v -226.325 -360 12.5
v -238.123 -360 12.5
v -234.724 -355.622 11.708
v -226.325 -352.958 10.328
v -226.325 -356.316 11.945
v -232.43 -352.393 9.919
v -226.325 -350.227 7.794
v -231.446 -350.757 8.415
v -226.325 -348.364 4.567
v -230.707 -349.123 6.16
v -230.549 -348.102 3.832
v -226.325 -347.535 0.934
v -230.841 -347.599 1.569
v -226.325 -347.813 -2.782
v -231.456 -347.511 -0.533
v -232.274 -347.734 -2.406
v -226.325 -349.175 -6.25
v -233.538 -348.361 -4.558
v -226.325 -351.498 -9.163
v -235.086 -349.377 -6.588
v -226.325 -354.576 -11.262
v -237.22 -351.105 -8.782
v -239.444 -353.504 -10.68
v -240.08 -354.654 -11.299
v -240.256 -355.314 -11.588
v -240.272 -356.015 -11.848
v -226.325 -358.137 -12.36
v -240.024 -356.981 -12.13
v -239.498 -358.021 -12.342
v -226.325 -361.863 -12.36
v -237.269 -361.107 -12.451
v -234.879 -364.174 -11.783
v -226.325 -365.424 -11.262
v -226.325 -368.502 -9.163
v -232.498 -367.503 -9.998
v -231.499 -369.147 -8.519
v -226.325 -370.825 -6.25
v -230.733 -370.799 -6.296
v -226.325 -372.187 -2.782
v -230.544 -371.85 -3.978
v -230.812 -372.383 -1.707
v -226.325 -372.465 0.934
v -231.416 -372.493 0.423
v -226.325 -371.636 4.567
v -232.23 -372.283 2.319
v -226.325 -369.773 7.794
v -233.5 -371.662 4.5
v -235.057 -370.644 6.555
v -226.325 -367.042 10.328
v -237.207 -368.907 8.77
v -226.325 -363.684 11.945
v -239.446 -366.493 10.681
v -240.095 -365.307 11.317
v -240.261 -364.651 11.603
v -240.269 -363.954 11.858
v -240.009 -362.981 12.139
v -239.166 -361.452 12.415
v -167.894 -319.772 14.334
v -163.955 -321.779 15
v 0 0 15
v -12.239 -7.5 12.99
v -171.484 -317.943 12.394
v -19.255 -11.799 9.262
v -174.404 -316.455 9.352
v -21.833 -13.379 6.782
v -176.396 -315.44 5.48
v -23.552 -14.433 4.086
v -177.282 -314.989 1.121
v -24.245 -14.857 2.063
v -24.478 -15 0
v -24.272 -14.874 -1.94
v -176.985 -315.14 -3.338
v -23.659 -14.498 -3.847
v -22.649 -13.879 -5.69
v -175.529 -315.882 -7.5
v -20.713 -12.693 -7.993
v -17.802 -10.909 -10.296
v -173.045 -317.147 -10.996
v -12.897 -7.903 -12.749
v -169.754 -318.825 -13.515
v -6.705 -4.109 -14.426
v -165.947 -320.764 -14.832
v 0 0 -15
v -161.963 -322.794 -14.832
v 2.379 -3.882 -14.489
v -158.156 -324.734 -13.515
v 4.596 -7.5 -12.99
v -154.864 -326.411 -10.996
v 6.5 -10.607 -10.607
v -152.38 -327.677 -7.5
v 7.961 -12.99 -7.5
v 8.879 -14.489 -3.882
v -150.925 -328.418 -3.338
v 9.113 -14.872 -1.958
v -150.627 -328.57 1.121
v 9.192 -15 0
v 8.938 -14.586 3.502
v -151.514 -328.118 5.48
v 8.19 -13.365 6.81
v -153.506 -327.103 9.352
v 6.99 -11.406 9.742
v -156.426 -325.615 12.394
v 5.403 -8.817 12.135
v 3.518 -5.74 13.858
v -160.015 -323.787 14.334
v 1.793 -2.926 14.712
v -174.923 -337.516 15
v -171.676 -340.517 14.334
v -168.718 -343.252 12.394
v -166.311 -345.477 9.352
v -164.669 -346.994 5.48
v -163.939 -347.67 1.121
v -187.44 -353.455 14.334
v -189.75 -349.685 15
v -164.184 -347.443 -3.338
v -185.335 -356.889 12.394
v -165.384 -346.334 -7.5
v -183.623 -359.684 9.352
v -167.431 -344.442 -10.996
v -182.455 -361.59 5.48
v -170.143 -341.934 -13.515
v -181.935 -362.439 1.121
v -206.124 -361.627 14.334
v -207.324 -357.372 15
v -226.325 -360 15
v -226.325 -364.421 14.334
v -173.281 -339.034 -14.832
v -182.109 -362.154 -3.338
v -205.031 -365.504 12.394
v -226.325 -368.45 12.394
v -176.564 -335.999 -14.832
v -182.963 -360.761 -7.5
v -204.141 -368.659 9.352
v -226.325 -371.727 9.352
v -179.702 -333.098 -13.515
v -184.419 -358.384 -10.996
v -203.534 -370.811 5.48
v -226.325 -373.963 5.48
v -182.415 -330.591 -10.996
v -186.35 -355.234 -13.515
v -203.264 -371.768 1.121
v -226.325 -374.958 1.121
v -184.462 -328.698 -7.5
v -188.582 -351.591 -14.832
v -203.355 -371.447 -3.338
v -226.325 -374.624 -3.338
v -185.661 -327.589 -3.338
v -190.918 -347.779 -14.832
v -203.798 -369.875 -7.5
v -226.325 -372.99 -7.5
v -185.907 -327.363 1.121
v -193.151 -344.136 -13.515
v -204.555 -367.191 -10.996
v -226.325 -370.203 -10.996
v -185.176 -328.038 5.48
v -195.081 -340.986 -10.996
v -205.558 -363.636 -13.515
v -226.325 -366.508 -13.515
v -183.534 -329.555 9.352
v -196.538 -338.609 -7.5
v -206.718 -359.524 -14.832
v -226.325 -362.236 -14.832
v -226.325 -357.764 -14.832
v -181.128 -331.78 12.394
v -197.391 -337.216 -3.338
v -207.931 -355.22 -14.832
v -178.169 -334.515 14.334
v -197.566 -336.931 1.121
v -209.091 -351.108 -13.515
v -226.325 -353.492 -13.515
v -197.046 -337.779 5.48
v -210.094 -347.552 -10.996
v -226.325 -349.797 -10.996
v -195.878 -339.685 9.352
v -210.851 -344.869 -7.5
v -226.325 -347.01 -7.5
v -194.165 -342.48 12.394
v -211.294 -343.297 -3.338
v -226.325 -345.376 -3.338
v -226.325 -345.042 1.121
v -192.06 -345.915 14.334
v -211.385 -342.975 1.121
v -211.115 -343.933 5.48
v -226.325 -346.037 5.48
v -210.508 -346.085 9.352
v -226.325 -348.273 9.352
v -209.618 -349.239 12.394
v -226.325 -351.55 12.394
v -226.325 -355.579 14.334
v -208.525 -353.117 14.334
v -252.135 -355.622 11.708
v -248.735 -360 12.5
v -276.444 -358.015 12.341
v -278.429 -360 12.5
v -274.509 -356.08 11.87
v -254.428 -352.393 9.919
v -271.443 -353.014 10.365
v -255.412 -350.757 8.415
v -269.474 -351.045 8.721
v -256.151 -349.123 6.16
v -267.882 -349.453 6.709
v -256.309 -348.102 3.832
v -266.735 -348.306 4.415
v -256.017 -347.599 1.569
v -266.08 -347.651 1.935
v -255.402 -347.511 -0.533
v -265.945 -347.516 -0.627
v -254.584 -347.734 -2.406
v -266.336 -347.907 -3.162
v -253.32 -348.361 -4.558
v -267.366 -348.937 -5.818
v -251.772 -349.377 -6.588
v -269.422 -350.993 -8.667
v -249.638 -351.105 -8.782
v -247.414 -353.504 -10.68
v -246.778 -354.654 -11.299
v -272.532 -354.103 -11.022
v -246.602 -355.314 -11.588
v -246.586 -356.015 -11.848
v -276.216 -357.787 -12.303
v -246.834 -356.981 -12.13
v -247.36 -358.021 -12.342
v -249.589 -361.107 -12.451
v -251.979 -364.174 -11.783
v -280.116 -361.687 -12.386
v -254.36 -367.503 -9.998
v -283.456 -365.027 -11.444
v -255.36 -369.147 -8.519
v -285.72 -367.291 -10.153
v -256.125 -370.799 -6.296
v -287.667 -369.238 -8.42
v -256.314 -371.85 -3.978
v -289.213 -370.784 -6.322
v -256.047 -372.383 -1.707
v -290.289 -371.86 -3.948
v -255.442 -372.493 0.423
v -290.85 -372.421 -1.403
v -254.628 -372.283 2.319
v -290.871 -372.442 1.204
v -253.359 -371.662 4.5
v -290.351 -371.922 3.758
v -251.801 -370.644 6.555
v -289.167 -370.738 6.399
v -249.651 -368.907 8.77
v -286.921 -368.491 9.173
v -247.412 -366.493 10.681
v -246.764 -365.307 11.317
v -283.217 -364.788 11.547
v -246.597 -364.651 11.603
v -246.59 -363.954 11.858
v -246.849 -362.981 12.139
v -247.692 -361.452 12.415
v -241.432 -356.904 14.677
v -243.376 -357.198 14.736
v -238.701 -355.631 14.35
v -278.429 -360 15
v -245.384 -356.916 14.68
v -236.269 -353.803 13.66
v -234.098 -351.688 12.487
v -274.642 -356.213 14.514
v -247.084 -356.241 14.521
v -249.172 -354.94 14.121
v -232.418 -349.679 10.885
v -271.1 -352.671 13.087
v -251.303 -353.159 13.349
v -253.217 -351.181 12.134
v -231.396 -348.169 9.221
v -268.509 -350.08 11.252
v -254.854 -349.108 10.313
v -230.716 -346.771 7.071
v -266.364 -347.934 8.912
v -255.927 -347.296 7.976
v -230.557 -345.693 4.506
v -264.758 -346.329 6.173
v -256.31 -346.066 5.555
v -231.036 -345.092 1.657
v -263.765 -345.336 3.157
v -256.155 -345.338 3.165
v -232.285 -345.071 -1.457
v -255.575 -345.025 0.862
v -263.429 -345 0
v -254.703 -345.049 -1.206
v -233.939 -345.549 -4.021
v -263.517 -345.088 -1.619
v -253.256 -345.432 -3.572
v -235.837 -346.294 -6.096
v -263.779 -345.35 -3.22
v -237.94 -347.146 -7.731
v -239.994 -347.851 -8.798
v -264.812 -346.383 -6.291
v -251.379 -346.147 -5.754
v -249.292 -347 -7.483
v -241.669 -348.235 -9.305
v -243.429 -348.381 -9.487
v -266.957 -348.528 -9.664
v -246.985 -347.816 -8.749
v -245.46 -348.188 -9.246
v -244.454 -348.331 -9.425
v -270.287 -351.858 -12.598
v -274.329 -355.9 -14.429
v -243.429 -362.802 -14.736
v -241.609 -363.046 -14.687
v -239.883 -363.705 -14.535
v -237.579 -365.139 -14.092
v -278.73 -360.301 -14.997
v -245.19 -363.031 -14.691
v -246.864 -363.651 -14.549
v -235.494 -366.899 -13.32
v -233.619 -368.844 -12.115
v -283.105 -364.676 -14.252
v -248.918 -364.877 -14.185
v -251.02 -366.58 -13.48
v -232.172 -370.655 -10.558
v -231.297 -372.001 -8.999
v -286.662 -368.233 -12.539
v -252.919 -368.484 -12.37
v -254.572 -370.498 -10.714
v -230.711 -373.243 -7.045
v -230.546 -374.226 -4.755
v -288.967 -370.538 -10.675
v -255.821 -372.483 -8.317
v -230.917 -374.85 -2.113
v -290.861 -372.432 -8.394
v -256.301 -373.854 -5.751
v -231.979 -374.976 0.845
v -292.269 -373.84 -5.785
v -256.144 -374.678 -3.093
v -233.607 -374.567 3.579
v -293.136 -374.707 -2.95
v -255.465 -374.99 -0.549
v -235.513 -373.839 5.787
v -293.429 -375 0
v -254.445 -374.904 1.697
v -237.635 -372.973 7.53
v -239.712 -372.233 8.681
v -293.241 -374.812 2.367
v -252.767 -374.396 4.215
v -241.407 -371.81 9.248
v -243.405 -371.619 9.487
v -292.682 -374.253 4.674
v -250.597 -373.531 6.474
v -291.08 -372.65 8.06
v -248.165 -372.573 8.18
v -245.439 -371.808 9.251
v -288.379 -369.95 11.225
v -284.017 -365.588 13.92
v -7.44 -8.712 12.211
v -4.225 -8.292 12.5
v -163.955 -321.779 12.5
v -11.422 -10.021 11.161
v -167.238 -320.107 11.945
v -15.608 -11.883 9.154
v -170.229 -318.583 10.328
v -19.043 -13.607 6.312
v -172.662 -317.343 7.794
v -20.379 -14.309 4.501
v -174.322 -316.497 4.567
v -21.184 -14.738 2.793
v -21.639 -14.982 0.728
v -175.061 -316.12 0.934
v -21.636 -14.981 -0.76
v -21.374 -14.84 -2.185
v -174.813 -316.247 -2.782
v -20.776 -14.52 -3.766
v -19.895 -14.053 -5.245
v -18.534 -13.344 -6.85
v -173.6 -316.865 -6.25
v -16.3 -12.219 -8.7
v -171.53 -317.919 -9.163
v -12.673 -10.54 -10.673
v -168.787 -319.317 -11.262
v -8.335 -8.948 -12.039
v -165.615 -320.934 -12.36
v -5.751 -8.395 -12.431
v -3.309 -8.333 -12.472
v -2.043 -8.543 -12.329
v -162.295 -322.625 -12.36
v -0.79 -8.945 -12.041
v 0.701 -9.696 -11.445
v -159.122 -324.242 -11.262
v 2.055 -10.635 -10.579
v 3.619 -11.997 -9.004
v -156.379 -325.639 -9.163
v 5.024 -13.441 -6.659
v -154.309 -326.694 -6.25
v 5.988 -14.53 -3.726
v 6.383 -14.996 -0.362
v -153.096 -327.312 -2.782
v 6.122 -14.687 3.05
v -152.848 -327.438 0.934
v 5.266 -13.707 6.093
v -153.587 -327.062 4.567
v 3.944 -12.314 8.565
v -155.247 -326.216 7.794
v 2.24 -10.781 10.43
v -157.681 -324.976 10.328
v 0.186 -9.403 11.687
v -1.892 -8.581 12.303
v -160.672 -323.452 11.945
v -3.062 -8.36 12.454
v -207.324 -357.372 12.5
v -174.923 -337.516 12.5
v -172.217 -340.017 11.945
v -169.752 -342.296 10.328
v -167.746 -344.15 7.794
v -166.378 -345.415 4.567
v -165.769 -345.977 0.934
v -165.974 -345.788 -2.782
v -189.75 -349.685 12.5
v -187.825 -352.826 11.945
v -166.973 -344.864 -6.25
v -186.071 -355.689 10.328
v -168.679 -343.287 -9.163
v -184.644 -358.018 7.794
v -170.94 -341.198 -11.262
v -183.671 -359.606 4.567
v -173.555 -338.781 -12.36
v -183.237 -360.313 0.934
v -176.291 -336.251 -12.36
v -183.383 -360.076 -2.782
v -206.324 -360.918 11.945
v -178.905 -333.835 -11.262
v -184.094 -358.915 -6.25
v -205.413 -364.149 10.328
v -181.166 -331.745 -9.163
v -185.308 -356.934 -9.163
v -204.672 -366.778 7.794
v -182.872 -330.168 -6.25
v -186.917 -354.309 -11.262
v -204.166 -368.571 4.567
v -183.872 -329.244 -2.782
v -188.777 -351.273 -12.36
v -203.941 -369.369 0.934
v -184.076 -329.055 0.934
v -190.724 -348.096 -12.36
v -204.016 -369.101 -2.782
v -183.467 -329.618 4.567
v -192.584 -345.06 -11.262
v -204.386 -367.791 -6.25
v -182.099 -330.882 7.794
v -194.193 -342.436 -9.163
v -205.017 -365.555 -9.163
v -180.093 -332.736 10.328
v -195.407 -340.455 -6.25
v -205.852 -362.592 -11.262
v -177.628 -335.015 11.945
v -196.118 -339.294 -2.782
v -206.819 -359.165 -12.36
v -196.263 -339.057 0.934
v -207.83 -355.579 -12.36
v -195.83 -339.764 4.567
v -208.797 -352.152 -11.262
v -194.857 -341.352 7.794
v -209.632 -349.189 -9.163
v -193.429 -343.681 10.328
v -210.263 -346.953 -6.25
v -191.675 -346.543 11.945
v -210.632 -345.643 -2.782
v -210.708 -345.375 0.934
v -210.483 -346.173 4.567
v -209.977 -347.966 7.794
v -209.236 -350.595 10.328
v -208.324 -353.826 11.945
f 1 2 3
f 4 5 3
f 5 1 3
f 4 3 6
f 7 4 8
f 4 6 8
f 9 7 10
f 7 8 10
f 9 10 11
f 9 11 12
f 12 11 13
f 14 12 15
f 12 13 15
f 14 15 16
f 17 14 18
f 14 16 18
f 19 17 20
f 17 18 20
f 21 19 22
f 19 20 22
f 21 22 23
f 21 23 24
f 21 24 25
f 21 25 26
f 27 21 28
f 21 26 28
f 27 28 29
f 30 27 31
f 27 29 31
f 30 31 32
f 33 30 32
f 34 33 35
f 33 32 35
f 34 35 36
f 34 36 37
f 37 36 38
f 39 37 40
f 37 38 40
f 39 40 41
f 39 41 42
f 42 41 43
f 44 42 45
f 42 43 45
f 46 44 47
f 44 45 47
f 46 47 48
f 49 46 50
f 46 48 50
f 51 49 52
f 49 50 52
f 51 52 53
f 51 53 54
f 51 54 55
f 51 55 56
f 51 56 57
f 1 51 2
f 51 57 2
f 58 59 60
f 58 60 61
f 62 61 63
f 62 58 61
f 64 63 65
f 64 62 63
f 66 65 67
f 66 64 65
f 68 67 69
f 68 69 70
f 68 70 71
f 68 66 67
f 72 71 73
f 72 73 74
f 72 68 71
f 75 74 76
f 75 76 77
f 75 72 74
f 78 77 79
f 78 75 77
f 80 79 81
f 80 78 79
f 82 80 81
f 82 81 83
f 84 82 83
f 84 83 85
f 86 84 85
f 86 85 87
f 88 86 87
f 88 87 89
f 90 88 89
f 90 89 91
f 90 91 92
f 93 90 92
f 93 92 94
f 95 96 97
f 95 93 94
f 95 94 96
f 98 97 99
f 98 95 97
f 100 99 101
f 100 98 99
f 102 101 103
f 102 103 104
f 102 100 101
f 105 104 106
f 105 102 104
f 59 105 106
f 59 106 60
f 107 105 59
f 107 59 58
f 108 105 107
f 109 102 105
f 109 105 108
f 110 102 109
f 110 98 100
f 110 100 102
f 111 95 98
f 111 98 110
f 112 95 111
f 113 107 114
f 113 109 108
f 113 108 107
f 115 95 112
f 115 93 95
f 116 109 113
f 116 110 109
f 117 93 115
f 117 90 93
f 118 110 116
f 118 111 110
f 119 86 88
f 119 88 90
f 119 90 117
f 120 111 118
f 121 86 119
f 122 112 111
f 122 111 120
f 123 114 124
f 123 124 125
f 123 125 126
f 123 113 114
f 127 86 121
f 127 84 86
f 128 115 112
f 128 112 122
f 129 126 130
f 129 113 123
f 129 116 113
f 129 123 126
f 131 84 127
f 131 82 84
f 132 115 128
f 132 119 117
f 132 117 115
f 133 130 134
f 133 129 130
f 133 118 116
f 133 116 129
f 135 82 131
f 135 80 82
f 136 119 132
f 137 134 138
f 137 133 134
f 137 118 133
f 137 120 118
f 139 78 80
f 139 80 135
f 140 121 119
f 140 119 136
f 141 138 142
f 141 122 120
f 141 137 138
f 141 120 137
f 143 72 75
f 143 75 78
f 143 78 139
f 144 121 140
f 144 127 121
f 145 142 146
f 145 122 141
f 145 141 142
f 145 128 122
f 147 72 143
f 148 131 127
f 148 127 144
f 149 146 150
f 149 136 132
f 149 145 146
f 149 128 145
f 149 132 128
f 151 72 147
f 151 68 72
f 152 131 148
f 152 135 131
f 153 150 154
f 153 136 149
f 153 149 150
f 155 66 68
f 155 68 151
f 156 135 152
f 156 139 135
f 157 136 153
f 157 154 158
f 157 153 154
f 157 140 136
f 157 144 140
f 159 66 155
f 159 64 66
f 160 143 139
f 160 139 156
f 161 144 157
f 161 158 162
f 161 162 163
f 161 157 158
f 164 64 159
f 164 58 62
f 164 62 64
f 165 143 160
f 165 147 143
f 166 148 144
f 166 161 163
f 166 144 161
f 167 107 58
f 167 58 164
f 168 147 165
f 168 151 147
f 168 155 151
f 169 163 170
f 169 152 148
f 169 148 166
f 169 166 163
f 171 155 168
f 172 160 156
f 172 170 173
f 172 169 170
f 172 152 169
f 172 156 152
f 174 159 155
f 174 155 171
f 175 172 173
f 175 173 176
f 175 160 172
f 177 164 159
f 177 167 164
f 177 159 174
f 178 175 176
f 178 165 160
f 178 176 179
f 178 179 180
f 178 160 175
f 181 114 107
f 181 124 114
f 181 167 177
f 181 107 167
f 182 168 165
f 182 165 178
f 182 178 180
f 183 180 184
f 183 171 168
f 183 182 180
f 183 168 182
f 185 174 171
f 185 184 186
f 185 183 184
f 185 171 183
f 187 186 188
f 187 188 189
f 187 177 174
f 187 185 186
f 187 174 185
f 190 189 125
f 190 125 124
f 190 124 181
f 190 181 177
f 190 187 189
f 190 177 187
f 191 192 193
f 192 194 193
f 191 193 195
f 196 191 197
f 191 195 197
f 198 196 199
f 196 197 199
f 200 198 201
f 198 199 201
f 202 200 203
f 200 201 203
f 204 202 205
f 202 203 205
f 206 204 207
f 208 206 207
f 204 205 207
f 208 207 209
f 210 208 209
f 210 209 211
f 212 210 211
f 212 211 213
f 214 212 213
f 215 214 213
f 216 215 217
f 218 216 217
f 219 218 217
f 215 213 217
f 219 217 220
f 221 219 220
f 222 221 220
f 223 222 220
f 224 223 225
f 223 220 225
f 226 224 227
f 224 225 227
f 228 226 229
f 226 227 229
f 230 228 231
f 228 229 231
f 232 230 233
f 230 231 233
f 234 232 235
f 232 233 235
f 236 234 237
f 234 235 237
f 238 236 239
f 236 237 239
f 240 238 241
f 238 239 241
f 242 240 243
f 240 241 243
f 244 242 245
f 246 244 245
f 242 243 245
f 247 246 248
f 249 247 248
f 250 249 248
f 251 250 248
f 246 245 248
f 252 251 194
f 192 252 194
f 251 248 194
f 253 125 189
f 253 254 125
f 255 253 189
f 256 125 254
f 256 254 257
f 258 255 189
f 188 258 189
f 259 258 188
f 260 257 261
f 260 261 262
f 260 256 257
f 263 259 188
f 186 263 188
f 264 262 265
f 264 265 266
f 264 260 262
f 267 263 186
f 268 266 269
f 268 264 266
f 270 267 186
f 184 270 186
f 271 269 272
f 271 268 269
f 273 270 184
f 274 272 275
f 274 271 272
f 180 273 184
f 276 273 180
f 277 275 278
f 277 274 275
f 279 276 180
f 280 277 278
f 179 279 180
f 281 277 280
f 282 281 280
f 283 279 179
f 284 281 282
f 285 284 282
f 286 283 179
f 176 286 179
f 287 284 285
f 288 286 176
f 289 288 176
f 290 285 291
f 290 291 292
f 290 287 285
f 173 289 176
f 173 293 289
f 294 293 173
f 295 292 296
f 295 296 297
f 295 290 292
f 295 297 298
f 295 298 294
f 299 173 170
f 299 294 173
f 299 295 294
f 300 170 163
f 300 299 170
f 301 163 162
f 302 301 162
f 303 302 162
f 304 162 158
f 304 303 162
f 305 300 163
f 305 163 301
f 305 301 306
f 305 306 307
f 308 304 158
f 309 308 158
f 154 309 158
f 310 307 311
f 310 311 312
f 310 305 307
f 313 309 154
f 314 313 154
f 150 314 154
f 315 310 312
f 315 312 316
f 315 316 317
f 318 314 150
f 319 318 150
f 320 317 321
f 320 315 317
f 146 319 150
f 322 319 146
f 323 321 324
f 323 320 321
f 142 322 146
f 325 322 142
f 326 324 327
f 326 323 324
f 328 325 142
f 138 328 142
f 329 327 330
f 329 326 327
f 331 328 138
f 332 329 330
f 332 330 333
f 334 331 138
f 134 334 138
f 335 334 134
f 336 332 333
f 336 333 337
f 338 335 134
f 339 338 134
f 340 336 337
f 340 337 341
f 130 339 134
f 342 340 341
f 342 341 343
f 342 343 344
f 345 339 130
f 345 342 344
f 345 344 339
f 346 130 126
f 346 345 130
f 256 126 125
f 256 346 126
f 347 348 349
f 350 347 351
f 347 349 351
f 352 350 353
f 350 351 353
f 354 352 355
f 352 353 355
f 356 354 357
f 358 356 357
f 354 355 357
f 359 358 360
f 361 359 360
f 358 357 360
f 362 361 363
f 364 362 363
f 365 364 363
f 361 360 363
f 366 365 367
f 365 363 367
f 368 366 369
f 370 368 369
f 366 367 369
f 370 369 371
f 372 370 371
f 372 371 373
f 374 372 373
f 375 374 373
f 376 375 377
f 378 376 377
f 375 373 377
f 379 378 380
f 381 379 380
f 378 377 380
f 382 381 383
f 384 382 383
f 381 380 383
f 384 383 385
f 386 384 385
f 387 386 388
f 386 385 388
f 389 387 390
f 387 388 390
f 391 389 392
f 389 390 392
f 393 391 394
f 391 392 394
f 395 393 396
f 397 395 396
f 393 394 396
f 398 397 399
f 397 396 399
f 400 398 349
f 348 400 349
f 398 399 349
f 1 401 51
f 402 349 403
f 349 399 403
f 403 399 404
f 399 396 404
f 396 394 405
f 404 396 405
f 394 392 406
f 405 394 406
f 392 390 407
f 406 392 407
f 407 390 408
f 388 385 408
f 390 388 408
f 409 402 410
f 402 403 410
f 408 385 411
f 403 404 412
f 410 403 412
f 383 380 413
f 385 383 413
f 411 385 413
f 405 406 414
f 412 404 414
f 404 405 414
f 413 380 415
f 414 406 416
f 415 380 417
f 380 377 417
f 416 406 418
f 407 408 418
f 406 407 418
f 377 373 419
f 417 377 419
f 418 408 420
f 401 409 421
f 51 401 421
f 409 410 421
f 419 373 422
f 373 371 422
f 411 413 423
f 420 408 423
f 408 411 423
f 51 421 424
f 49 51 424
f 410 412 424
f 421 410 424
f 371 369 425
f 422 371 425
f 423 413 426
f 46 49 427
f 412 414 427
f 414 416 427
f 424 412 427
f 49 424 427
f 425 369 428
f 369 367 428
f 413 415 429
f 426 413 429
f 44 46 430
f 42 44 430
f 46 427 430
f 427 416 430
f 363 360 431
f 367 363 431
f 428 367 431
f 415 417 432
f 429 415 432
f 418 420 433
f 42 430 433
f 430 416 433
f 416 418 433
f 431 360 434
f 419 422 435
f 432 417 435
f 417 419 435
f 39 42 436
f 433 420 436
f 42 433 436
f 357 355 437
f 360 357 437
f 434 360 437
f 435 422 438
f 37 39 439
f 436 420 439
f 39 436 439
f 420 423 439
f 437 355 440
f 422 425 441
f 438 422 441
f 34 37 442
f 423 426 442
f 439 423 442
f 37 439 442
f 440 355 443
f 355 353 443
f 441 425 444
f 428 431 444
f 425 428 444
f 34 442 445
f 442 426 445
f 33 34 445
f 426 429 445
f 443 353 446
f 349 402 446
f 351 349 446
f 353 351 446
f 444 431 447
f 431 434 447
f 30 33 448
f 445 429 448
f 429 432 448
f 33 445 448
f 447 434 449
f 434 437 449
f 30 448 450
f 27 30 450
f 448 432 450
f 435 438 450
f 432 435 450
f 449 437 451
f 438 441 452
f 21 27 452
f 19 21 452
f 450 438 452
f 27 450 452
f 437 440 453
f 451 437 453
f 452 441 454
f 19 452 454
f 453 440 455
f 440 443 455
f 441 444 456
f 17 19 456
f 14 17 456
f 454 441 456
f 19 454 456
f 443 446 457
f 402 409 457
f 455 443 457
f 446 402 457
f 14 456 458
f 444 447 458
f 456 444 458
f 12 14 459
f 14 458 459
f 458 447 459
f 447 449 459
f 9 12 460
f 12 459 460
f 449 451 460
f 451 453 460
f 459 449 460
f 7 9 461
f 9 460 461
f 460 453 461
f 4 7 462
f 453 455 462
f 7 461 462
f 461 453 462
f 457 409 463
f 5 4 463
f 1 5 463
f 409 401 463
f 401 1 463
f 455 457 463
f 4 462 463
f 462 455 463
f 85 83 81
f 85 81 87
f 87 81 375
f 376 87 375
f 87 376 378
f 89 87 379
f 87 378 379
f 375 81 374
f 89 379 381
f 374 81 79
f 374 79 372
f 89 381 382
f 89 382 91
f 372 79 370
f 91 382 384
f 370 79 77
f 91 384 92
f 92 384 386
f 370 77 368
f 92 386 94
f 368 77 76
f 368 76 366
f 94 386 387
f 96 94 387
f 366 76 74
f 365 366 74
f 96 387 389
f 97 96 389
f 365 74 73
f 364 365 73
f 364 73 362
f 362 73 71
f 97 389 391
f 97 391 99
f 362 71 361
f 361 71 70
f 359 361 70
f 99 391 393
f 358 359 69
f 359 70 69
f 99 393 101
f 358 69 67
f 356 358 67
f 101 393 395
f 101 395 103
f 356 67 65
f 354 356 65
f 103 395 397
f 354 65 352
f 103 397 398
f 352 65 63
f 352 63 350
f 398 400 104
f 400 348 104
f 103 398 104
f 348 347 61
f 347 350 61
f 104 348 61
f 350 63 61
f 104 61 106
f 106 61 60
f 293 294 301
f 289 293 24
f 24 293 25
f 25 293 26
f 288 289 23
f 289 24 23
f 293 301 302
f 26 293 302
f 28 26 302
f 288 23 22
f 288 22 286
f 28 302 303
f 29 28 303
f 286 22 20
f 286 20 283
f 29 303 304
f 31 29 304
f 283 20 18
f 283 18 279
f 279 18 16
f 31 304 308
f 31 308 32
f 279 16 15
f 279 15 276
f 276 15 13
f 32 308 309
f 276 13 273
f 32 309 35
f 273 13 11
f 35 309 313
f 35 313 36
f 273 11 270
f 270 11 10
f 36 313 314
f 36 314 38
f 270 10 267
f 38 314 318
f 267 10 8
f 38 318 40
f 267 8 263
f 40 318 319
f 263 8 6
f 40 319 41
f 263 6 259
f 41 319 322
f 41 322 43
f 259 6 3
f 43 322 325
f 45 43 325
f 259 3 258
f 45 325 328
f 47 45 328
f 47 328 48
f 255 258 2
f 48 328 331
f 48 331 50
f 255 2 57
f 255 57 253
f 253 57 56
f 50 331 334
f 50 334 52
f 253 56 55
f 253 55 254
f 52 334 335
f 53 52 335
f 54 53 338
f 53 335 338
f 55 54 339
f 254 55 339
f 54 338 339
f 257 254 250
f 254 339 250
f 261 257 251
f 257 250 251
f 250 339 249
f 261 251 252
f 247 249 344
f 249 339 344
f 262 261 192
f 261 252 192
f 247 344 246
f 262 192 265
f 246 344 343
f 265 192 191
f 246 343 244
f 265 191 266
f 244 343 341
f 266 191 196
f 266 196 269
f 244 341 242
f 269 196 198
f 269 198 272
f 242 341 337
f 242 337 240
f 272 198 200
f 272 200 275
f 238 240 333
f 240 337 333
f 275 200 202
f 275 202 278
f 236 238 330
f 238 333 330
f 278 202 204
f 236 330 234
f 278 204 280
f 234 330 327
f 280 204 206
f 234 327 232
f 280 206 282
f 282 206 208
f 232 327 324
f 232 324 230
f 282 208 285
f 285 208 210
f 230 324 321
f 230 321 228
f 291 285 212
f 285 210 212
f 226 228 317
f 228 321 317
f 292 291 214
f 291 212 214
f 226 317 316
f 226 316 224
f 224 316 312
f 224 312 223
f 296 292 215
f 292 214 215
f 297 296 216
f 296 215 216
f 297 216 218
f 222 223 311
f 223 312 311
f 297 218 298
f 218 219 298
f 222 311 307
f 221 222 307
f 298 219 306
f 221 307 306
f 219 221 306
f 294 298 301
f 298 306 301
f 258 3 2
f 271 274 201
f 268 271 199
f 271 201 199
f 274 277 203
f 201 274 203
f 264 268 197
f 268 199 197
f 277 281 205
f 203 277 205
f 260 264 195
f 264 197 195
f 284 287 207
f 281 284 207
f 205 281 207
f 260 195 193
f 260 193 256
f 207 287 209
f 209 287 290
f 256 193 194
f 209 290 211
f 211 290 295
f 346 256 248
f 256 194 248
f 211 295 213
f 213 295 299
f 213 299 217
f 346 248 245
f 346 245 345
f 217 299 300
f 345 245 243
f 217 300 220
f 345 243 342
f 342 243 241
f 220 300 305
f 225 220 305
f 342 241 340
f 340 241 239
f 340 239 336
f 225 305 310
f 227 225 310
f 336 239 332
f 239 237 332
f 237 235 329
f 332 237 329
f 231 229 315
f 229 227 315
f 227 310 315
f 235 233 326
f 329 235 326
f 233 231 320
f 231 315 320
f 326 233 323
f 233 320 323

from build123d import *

# Parameters (mm, degrees)
SKETCH_2_R               = 15
SKETCH_3_R               = 12.5
CUT_EXTRUDE_1_DEPTH      = 477.393401595
CUT_EXTRUDE_1_DEPTH_BACK = 477.393401595
CUT_EXTRUDE_2_DEPTH      = 477.393401595
CUT_EXTRUDE_2_DEPTH_BACK = 477.393401595
SKETCH_8_R               = 12.88885
CUT_EXTRUDE_1048_DEPTH   = 464.426364673


with BuildPart() as part:
    # Sweep 1: sweep along a path in Эскиз1
    with BuildLine(Plane.XY) as sweep_1_path:
        Line((0, 0), (-163.954760295, -321.779334982))
        ThreePointArc((-163.954760295, -321.779334982), (-189.750317458, -349.684811505), (-226.325216988, -360))
        Line((-226.325216988, -360), (-293.429161818, -360))
    # Эскиз2 → Sweep 1 (sweep)
    with BuildSketch(Plane(origin=(-293.429161818, -360, 0), x_dir=(0, 0, 1), z_dir=(-1, 0, 0))):
        Circle(SKETCH_2_R)
    sweep(path=sweep_1_path.line)

    # Sweep 1 2: sweep along a path in Эскиз1<2>
    with BuildLine(Plane.XY) as sweep_1_2_path:
        Line((0, 0), (-163.954760295, -321.779334982))
        ThreePointArc((-163.954760295, -321.779334982), (-189.750317458, -349.684811505), (-226.325216988, -360))
        Line((-226.325216988, -360), (-293.429161818, -360))
    # Эскиз3 → Sweep 1 2 (sweep, cut)
    with BuildSketch(Plane.ZY.offset(293.429161818)):
        with Locations((0, -360)):
            Circle(SKETCH_3_R)
    sweep(path=sweep_1_2_path.line, mode=Mode.SUBTRACT)

    # Эскиз4 → Вырез-Вытянуть1 (cut, two sides: drawn at the far end of the back side and taken through both)
    with BuildSketch(Plane.XY.offset(-CUT_EXTRUDE_1_DEPTH_BACK)):
        Polygon((-263.429161818, -345), (-293.429161818, -375), (-293.429161818, -345), align=None)
    extrude(amount=CUT_EXTRUDE_1_DEPTH + CUT_EXTRUDE_1_DEPTH_BACK, mode=Mode.SUBTRACT)

    # Эскиз5 → Вырез-Вытянуть2 (cut, two sides: drawn at the far end of the back side and taken through both)
    with BuildSketch(Plane(origin=(0, 0, 0), x_dir=(0, 0, -1), z_dir=(1, 0, 0)).offset(-CUT_EXTRUDE_2_DEPTH_BACK)):
        with BuildLine():
            Line((-15, 0), (-15, 6.809857496))
            Line((-15, 6.809857496), (15, 6.809857496))
            Line((15, 6.809857496), (15, 0))
            ThreePointArc((15, 0), (0, -15), (-15, 0))
        make_face()
    extrude(amount=CUT_EXTRUDE_2_DEPTH + CUT_EXTRUDE_2_DEPTH_BACK, mode=Mode.SUBTRACT)

    # Эскиз8 → Cut-Extrude 1048 (cut, through all)
    with BuildSketch(Plane(origin=(0, -331.983389073, -120.832071893), x_dir=(1, 0, 0), z_dir=(0, -0.9396926207859081, -0.34202014332566943))):
        with Locations((-243.429161818, 123.127251597)):
            Circle(SKETCH_8_R)
    extrude(amount=-CUT_EXTRUDE_1048_DEPTH, mode=Mode.SUBTRACT)


solid = part.part
